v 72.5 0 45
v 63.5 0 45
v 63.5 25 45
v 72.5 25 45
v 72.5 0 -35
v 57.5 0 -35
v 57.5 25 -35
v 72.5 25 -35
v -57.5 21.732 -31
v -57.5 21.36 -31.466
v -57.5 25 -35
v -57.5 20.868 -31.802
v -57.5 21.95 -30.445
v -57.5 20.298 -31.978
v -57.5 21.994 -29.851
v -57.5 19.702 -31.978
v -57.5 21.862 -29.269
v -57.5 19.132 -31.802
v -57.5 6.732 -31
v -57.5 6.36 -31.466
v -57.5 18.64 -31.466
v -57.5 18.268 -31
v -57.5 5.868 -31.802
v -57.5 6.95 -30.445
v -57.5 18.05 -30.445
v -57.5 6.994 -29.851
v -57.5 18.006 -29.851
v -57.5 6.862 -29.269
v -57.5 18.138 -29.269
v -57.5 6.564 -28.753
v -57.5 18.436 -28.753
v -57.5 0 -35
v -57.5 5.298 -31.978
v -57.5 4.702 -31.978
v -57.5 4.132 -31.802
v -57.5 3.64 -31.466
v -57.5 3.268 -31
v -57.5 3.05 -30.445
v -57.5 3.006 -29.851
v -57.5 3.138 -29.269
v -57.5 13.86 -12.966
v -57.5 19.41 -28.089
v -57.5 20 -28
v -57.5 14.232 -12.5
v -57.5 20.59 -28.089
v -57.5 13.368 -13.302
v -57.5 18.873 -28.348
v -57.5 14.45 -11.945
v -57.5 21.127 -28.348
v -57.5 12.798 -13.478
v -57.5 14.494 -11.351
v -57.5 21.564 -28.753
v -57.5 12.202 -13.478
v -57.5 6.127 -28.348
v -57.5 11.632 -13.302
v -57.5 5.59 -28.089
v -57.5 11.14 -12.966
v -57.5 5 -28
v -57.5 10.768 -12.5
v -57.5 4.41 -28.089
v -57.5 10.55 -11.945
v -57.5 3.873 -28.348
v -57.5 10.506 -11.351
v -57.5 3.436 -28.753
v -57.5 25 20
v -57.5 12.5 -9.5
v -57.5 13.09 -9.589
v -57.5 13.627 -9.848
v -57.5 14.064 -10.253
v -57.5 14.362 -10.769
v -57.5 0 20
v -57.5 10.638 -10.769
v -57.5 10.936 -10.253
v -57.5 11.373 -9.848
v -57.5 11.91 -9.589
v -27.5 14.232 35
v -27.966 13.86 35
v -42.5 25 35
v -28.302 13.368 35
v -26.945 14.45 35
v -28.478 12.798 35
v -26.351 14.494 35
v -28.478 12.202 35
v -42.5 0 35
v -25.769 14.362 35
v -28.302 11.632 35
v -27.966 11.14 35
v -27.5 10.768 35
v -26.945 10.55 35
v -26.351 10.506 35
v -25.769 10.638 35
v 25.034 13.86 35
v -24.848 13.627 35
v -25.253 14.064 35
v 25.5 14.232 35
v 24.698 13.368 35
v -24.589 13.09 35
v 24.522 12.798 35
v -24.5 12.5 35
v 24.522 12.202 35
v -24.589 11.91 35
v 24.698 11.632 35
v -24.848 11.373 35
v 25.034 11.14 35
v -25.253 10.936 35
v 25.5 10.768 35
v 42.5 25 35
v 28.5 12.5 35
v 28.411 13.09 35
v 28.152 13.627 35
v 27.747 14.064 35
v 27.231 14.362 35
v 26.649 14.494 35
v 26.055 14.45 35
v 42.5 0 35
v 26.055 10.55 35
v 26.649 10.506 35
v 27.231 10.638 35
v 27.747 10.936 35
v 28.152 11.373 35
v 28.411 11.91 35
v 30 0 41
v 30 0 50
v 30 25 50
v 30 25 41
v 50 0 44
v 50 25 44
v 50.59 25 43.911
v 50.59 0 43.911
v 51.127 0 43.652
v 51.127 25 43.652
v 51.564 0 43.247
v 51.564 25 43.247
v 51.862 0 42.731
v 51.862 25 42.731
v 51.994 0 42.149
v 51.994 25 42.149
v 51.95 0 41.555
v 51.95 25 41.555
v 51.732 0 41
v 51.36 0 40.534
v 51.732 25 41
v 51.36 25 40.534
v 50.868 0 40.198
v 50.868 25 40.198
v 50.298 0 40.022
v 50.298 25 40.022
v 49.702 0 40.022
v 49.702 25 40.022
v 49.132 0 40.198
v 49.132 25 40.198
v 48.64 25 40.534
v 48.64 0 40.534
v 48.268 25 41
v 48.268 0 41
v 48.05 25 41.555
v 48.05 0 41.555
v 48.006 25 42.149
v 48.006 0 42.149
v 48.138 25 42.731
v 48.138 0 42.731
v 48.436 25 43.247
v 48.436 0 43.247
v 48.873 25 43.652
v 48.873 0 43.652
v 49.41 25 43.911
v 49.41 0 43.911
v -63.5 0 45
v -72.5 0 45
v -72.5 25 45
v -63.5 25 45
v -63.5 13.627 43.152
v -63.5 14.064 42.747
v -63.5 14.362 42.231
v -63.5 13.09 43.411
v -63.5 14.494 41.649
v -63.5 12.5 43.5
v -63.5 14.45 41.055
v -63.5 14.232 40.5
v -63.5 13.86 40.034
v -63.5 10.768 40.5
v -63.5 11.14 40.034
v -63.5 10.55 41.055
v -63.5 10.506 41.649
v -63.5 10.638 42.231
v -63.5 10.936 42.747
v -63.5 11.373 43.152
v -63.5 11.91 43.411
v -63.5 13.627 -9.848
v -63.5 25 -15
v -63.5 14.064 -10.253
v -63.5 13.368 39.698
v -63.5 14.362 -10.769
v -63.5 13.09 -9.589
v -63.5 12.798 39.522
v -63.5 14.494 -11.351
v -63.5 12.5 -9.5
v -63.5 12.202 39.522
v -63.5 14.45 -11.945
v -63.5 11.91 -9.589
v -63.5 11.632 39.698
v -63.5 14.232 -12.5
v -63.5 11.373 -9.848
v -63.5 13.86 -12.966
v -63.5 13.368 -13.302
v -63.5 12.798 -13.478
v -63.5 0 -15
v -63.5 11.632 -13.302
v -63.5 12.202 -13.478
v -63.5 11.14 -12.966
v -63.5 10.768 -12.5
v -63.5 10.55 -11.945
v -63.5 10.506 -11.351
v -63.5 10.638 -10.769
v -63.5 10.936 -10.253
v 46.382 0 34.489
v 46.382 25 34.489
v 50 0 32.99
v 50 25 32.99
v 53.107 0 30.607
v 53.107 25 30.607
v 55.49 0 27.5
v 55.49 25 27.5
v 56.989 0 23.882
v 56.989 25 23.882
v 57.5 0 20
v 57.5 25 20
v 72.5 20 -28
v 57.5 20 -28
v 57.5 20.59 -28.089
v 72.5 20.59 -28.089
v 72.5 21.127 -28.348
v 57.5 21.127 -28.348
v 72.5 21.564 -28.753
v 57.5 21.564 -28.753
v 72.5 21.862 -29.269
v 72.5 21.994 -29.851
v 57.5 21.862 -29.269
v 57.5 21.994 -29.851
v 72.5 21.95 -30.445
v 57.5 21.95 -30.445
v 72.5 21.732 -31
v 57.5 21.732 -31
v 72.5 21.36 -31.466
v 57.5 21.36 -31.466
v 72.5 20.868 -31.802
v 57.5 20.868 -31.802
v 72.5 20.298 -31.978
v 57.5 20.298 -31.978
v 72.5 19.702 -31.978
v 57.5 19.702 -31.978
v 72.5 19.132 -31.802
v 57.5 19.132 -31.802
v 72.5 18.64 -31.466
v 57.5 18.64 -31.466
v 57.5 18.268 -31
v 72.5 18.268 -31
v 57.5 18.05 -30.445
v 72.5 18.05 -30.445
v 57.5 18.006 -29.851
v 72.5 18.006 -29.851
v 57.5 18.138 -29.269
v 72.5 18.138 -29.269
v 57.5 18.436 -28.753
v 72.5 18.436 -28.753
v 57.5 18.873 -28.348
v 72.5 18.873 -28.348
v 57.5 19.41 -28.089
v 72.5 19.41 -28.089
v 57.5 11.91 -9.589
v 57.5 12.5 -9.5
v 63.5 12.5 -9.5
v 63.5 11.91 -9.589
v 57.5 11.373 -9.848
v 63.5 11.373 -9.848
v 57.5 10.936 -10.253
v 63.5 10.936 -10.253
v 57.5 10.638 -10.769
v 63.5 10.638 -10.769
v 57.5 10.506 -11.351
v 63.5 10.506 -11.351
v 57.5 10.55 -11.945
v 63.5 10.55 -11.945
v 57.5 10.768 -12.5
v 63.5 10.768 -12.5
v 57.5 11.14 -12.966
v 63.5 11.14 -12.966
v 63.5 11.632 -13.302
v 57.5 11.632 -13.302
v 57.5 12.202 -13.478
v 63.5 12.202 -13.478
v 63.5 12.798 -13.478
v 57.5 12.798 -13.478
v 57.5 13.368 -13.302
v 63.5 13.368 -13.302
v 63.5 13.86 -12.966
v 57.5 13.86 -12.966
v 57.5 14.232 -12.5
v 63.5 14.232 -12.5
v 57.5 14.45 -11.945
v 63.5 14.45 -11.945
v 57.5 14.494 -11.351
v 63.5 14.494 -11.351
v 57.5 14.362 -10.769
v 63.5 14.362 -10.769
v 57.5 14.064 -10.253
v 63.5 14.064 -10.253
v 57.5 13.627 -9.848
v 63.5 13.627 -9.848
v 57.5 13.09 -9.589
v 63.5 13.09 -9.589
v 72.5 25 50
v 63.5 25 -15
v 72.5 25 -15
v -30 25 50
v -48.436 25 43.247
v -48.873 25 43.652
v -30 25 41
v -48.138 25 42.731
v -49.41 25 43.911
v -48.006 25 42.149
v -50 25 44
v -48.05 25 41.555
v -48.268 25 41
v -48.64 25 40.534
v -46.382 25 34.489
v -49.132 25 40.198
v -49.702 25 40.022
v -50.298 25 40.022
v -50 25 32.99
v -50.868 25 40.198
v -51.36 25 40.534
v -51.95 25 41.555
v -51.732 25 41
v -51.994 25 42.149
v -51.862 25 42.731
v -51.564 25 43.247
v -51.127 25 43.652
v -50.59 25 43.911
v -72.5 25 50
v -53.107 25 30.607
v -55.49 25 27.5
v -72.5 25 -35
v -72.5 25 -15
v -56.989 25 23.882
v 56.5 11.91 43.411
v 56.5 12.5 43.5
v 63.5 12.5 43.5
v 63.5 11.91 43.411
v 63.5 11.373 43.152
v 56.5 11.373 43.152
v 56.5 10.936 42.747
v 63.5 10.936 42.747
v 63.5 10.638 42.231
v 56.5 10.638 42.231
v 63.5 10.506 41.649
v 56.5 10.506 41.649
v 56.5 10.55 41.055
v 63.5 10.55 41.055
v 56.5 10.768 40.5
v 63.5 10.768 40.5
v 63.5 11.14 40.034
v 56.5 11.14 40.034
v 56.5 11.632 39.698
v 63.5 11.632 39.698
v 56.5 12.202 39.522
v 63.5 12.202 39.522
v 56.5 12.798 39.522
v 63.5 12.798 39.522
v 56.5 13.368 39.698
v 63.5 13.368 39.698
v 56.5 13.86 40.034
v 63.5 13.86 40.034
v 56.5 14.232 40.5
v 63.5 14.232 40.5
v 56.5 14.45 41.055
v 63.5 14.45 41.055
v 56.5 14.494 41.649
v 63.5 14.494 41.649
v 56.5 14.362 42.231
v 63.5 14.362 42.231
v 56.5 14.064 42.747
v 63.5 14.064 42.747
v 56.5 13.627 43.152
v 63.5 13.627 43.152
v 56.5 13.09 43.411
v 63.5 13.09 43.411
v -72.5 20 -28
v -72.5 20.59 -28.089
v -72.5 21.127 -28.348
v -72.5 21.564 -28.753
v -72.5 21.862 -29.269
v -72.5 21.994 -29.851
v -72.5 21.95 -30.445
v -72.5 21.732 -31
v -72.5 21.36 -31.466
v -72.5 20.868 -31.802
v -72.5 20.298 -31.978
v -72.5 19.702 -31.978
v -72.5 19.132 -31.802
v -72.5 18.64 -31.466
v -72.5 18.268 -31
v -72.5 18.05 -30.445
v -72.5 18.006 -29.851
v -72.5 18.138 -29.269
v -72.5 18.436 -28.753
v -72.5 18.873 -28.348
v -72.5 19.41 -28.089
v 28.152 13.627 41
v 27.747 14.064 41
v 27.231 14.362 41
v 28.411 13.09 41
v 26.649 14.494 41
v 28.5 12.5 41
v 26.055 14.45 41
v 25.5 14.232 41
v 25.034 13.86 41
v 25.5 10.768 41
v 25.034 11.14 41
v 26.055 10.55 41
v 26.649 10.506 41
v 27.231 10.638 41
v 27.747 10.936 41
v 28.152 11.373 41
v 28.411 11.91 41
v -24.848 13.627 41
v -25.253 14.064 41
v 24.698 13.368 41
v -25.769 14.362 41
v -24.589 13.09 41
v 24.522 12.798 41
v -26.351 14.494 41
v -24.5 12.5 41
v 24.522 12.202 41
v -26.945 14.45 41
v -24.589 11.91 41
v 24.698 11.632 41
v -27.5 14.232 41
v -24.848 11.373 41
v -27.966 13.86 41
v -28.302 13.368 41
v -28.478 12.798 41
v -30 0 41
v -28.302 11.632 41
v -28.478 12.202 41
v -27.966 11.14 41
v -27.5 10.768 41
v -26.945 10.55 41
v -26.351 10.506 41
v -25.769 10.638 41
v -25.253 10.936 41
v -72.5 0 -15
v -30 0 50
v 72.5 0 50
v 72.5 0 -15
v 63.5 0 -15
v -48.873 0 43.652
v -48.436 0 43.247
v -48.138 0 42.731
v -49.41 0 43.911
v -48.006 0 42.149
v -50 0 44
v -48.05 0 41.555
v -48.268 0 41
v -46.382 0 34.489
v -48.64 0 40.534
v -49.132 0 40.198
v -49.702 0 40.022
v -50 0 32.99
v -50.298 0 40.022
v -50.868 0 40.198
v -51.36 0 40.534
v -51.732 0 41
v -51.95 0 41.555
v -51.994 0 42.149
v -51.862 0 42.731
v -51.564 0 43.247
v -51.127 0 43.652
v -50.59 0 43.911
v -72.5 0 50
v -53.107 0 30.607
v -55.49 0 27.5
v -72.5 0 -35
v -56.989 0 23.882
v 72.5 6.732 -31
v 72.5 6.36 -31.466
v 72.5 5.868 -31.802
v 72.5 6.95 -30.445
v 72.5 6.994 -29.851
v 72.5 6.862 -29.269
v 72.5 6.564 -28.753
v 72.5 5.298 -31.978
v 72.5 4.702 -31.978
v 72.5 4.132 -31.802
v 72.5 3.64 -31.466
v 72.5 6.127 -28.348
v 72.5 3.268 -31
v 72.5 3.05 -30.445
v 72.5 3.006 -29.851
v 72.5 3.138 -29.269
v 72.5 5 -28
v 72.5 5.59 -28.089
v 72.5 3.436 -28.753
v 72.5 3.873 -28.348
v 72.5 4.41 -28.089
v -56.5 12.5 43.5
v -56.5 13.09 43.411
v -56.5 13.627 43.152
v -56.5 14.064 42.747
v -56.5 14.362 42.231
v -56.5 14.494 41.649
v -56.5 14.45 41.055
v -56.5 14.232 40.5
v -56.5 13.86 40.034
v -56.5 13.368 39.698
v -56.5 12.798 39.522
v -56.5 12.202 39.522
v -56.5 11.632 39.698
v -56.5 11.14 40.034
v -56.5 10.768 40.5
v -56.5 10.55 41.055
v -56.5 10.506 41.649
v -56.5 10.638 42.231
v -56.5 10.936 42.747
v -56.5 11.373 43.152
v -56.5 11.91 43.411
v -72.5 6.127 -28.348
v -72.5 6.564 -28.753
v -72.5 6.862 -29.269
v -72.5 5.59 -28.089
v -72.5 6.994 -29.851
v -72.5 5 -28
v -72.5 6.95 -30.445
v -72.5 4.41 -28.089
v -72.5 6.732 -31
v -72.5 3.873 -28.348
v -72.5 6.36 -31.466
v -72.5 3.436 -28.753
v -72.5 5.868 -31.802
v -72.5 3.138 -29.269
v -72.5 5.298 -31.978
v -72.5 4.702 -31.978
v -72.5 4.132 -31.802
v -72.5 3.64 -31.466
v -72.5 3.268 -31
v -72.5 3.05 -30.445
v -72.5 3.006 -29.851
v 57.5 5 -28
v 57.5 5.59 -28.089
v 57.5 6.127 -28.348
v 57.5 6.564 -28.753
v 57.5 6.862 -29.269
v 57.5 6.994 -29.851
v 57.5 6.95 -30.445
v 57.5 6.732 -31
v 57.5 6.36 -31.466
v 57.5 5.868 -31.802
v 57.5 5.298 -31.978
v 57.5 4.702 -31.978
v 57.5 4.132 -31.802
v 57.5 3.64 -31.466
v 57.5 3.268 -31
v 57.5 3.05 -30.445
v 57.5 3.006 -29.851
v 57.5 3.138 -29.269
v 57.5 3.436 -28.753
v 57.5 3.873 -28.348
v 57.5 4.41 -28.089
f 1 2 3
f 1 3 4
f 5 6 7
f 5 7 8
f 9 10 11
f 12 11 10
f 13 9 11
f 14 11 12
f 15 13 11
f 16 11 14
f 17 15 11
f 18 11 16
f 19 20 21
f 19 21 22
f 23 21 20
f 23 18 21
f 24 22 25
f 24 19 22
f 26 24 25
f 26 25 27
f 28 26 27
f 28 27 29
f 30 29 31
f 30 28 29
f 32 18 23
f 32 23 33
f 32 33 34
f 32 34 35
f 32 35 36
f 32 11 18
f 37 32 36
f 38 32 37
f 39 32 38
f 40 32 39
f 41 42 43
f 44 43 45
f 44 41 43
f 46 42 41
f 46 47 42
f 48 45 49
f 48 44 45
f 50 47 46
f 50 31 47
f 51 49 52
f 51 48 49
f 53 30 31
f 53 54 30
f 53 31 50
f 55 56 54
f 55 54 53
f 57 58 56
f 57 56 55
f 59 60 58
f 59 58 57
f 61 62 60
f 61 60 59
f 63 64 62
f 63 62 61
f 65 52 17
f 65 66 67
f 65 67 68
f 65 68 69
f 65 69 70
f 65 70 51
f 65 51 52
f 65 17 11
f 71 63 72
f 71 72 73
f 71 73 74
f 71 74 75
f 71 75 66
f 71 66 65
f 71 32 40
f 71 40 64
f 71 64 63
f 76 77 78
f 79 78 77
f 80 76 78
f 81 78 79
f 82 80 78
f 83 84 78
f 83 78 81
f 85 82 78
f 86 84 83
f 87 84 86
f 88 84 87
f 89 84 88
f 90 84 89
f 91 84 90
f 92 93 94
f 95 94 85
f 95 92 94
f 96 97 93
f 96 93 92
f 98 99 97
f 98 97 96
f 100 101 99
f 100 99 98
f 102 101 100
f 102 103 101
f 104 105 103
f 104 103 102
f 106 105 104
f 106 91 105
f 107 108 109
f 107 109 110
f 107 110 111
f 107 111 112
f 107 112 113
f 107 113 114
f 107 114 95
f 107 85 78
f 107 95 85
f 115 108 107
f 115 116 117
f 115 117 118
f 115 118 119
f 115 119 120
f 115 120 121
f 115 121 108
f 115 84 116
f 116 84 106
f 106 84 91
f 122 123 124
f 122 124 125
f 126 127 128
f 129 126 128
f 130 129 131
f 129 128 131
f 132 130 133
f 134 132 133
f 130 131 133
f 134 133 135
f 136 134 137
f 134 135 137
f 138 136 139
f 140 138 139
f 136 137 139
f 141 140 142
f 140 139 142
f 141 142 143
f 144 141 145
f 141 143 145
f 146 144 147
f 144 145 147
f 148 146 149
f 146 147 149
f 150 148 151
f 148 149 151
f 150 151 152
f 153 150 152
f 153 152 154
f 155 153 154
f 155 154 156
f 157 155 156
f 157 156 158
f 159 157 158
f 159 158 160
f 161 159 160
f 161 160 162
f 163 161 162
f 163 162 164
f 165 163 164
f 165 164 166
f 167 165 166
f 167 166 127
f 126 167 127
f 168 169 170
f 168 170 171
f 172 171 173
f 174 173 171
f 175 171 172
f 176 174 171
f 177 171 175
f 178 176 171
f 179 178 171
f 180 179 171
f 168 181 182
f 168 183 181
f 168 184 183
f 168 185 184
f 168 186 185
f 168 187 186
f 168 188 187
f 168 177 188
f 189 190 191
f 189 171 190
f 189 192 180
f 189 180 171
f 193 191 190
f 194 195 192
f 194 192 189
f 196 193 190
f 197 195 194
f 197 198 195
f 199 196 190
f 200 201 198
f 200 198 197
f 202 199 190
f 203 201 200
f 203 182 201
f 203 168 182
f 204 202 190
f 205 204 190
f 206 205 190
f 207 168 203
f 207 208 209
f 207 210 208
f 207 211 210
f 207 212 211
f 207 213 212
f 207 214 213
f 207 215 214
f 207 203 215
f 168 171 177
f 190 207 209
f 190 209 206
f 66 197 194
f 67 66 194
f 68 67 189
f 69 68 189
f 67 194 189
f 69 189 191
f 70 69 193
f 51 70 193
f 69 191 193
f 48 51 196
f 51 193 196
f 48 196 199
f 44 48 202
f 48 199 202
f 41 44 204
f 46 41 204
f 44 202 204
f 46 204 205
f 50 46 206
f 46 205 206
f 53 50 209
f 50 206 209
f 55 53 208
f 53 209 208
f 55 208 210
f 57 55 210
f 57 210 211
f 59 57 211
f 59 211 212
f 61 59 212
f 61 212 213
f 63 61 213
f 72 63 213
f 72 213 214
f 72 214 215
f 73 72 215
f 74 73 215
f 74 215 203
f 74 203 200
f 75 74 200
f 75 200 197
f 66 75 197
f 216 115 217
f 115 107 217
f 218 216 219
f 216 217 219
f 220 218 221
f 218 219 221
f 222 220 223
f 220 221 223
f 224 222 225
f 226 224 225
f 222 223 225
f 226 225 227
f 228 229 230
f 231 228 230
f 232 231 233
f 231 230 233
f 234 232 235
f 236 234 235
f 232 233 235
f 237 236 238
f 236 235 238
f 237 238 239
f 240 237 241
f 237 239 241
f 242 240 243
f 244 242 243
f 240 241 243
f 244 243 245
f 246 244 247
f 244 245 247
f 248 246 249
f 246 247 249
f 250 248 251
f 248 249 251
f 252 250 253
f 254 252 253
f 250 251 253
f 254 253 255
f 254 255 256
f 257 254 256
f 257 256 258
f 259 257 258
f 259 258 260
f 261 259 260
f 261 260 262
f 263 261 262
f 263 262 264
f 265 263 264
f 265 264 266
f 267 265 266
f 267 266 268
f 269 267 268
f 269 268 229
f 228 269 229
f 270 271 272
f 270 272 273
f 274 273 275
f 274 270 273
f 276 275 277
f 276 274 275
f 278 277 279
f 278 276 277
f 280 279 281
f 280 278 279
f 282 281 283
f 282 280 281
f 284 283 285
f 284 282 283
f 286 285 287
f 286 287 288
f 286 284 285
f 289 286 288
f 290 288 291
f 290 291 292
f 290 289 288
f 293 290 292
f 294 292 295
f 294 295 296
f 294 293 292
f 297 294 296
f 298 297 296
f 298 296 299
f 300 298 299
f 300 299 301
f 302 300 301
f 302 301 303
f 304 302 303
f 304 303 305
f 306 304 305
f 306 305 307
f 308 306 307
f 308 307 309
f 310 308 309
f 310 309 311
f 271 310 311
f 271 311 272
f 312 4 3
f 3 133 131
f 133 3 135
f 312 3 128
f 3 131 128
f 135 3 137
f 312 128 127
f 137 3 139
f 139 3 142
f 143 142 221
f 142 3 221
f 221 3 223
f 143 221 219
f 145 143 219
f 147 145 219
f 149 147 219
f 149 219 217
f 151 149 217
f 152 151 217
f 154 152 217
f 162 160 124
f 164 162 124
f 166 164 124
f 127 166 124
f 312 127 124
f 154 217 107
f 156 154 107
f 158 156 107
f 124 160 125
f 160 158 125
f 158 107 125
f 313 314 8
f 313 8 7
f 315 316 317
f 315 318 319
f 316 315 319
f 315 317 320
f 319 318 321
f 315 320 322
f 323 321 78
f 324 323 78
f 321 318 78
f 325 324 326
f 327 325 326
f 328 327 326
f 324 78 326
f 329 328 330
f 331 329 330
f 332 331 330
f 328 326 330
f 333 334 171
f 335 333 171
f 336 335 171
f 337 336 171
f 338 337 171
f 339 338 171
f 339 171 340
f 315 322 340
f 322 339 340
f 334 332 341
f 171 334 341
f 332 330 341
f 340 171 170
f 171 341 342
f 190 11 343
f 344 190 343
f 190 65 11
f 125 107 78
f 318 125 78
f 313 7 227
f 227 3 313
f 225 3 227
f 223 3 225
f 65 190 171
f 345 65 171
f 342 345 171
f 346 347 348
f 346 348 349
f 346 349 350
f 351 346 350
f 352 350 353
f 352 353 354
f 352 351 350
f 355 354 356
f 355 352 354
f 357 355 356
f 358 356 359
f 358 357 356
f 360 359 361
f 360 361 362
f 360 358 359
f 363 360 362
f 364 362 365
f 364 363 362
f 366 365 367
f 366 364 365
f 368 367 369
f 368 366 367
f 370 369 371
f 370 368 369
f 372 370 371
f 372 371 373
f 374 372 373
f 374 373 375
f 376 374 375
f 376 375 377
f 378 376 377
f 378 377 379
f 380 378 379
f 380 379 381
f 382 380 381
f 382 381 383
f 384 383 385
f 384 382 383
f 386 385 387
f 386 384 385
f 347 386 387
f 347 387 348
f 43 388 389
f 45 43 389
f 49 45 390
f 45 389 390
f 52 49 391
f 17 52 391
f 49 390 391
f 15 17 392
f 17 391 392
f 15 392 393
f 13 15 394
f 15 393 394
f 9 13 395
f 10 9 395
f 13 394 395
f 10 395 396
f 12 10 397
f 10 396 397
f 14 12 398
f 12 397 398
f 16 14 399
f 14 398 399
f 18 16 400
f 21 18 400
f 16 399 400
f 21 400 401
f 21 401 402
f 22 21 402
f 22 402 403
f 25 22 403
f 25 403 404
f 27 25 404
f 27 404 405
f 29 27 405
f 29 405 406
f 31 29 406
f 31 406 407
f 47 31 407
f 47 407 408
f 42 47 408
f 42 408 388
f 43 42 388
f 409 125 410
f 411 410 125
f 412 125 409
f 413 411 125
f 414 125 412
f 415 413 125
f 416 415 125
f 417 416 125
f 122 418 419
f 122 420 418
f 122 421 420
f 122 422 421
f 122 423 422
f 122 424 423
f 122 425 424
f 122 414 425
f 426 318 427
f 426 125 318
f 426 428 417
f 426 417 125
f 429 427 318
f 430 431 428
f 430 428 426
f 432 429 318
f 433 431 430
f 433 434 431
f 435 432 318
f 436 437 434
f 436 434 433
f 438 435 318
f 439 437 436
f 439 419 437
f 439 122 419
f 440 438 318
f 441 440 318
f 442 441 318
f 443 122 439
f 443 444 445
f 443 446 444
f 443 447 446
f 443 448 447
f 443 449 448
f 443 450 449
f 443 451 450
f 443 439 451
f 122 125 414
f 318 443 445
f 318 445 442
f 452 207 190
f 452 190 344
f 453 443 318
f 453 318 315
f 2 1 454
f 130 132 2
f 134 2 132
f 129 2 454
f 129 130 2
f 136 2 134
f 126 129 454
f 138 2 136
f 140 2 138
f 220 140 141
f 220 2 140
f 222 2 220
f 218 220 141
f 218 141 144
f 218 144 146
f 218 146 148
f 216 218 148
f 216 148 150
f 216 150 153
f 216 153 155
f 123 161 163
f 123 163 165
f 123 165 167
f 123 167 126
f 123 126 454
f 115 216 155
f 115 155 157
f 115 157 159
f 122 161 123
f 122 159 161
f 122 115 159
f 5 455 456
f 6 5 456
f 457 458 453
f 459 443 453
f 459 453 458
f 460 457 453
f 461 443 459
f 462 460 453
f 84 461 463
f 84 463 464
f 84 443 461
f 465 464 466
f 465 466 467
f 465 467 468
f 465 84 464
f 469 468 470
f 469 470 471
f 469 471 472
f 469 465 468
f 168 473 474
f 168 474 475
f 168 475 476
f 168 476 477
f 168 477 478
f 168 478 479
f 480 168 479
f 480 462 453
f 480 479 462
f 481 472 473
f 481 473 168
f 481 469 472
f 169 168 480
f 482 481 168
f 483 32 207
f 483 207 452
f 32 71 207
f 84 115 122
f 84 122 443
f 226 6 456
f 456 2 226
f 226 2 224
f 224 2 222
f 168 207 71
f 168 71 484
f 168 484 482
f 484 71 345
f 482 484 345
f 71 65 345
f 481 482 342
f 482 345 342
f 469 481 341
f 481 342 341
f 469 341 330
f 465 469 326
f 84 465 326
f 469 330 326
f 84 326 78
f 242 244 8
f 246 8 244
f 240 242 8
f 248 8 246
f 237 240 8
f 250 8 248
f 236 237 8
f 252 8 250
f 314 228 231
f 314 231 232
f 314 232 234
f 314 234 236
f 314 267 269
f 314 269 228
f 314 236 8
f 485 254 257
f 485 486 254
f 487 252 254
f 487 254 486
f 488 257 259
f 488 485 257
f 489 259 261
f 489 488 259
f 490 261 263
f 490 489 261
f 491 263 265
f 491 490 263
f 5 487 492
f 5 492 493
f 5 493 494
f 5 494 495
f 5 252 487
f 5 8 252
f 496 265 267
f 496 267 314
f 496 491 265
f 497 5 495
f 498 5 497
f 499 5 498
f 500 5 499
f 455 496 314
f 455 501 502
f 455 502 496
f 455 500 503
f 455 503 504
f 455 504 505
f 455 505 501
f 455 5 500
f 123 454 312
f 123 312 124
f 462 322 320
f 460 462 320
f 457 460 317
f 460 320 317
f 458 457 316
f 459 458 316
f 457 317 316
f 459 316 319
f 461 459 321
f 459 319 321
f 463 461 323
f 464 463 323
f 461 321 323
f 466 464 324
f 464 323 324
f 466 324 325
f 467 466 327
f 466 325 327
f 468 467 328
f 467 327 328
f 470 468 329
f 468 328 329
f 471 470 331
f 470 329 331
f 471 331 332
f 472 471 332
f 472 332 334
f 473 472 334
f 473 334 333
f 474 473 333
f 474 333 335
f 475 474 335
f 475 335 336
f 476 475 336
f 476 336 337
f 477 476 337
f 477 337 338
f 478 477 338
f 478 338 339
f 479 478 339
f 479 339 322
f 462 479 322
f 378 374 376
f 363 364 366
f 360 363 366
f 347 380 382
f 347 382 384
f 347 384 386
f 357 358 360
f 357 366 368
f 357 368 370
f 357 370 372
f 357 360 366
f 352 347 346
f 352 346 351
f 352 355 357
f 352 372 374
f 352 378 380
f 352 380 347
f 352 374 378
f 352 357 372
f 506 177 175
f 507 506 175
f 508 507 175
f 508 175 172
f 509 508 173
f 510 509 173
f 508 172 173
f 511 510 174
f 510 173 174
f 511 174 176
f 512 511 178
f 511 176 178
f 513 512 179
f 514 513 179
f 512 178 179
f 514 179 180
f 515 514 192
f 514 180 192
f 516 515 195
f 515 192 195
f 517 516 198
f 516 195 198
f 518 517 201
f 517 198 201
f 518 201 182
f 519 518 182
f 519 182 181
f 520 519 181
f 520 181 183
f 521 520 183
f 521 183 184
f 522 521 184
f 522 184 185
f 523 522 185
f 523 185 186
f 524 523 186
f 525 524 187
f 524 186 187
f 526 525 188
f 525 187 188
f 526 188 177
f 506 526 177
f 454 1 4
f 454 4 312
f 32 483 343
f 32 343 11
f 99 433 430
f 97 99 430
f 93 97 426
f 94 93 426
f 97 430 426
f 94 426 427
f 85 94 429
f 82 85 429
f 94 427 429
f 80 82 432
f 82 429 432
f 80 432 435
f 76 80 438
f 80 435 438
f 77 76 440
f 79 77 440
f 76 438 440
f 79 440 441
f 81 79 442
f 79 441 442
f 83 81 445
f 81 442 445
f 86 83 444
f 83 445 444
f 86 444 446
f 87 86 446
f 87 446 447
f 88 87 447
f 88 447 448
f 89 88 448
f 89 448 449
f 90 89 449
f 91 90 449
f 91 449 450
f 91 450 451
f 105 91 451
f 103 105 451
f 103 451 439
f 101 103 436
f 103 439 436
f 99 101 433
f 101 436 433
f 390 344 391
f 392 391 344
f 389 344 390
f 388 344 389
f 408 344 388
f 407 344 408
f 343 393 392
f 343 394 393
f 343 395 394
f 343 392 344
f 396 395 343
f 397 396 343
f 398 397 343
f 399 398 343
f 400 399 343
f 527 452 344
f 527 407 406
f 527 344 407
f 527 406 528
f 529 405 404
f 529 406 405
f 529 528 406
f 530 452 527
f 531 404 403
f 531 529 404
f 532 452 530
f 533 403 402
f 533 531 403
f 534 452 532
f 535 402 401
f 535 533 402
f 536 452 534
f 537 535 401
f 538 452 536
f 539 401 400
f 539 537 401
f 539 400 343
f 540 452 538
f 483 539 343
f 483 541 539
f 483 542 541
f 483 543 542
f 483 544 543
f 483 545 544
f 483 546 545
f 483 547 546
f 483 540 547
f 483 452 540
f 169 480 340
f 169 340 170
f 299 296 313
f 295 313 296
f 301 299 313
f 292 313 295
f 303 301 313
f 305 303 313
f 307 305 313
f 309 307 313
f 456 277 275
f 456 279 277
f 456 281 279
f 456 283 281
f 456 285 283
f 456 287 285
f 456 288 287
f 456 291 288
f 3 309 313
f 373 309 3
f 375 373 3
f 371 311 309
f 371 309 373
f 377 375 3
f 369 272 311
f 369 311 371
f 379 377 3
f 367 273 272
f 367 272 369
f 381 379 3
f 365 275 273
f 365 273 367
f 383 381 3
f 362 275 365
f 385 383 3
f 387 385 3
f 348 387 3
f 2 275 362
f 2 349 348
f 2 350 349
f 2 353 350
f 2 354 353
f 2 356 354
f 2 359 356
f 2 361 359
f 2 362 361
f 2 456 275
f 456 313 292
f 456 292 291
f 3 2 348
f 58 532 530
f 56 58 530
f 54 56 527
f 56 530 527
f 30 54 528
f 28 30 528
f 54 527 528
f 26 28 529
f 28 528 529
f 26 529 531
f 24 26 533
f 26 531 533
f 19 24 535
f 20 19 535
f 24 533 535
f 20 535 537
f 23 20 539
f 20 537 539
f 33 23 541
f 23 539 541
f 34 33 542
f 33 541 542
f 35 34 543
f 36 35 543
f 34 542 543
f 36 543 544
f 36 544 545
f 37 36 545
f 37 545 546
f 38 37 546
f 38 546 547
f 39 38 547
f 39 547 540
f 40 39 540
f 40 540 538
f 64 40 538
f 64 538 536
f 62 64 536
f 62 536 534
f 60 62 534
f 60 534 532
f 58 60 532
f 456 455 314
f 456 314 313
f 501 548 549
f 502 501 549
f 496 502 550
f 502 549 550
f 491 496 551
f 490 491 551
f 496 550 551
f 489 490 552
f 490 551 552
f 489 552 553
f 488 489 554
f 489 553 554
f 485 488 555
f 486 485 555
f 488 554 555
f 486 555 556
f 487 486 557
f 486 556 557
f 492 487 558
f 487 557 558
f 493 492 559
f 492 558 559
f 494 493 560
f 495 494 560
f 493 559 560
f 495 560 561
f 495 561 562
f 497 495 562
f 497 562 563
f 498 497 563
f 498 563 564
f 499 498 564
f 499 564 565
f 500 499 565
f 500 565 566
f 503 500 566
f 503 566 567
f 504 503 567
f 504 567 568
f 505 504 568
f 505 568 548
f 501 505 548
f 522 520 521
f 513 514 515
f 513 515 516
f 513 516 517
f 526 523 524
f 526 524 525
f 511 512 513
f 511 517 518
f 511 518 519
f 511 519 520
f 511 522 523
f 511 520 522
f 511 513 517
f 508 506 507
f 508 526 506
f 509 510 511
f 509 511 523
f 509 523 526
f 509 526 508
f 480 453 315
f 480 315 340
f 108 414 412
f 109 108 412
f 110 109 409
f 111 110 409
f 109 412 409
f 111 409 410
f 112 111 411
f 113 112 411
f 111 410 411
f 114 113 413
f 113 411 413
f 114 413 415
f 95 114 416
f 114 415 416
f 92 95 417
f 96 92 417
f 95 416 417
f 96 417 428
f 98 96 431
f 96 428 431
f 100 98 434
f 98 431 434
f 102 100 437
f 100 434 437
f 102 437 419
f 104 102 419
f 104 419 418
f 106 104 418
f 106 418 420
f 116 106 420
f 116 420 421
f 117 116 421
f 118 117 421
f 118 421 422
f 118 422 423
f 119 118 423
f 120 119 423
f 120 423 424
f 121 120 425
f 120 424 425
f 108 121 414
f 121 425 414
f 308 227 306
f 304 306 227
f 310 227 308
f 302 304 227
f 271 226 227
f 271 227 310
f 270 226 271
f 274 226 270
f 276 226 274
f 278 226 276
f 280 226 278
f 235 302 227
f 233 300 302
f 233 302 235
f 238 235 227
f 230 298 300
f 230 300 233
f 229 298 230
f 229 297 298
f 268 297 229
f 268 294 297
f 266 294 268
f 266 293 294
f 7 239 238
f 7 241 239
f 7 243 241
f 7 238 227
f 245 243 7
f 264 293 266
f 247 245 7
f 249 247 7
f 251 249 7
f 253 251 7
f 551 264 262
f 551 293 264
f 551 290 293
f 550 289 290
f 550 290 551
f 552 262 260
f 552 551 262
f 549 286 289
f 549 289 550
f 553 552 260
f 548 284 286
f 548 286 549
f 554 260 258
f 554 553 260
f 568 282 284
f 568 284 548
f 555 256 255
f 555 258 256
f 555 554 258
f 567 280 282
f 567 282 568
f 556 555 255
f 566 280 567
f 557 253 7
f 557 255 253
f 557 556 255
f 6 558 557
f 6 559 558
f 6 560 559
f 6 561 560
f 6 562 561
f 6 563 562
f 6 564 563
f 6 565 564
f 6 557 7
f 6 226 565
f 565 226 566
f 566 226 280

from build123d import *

# Parameters (mm, degrees)
BOSS_EXTRUDE1_DEPTH = 25
SKETCH2_R           = 2
CUT_EXTRUDE1_DEPTH  = 6
SKETCH3_R           = 2
CUT_EXTRUDE2_DEPTH  = 7
CUT_EXTRUDE3_START  = -7
SKETCH10_R          = 2
CUT_EXTRUDE3_DEPTH  = 7
FILLET1_R           = 15
SKETCH13_R          = 2
CUT_EXTRUDE6_DEPTH  = 156.402702679
SKETCH14_R          = 2
CUT_EXTRUDE7_DEPTH  = 92.549167118


with BuildPart() as part:
    # Sketch1 → Boss-Extrude1 (new body)
    with BuildSketch(Plane(origin=(0, 0, 0), x_dir=(1, 0, 0), z_dir=(0, 1, 0))):
        Polygon((63.5, 15), (63.5, -45), (72.5, -45), (72.5, -50), (30, -50), (30, -41), (-30, -41), (-30, -50), (-72.5, -50), (-72.5, -45), (-63.5, -45), (-63.5, 15), (-72.5, 15), (-72.5, 35), (-57.5, 35), (-57.5, -35), (57.5, -35), (57.5, 35), (72.5, 35), (72.5, 15), align=None)
    extrude(amount=BOSS_EXTRUDE1_DEPTH)

    # Sketch2 → Cut-Extrude1 (cut)
    with BuildSketch(Plane.XY.offset(41)):
        with Locations((-26.5, 12.5)):
            Circle(SKETCH2_R)
        with Locations((26.5, 12.5)):
            Circle(SKETCH2_R)
    extrude(amount=-CUT_EXTRUDE1_DEPTH, mode=Mode.SUBTRACT)

    # Sketch3 → Cut-Extrude2 (cut)
    with BuildSketch(Plane.ZY.offset(63.5)):
        with Locations((-11.5, 12.5)):
            Circle(SKETCH3_R)
        with Locations((41.5, 12.5)):
            Circle(SKETCH3_R)
    extrude(amount=-CUT_EXTRUDE2_DEPTH, mode=Mode.SUBTRACT)

    # Sketch10 → Cut-Extrude3 (cut)
    with BuildSketch(Plane(origin=(63.5, 0, 0), x_dir=(0, 0, -1), z_dir=(1, 0, 0)).offset(CUT_EXTRUDE3_START)):
        with Locations(Location((-41.5, 12.5, 0), (0, 0, 180))):
            Circle(SKETCH10_R)
        with Locations(Location((11.5, 12.5, 0), (0, 0, 180))):
            Circle(SKETCH10_R)
    extrude(amount=CUT_EXTRUDE3_DEPTH, mode=Mode.SUBTRACT)

    # Fillet1
    fillet1_edges = [part.edges().sort_by_distance(p)[0] for p in [
        (-57.5, 12.5, 35),
        (57.5, 12.5, 35),
    ]]
    fillet(fillet1_edges, radius=FILLET1_R)

    # Sketch13 → Cut-Extrude6 (cut, through all)
    with BuildSketch(Plane.ZY.offset(72.5)):
        with Locations((-30, 20)):
            Circle(SKETCH13_R)
        with Locations((-30, 5)):
            Circle(SKETCH13_R)
    extrude(amount=-CUT_EXTRUDE6_DEPTH, mode=Mode.SUBTRACT)

    # Sketch14 → Cut-Extrude7 (cut, through all)
    with BuildSketch(Plane(origin=(0, 25, 0), x_dir=(1, 0, 0), z_dir=(0, 1, 0))):
        with Locations(Location((50, -42, 0), (0, 0, 270))):
            Circle(SKETCH14_R)
        with Locations(Location((-50, -42, 0), (0, 0, 270))):
            Circle(SKETCH14_R)
    extrude(amount=-CUT_EXTRUDE7_DEPTH, mode=Mode.SUBTRACT)


solid = part.part
